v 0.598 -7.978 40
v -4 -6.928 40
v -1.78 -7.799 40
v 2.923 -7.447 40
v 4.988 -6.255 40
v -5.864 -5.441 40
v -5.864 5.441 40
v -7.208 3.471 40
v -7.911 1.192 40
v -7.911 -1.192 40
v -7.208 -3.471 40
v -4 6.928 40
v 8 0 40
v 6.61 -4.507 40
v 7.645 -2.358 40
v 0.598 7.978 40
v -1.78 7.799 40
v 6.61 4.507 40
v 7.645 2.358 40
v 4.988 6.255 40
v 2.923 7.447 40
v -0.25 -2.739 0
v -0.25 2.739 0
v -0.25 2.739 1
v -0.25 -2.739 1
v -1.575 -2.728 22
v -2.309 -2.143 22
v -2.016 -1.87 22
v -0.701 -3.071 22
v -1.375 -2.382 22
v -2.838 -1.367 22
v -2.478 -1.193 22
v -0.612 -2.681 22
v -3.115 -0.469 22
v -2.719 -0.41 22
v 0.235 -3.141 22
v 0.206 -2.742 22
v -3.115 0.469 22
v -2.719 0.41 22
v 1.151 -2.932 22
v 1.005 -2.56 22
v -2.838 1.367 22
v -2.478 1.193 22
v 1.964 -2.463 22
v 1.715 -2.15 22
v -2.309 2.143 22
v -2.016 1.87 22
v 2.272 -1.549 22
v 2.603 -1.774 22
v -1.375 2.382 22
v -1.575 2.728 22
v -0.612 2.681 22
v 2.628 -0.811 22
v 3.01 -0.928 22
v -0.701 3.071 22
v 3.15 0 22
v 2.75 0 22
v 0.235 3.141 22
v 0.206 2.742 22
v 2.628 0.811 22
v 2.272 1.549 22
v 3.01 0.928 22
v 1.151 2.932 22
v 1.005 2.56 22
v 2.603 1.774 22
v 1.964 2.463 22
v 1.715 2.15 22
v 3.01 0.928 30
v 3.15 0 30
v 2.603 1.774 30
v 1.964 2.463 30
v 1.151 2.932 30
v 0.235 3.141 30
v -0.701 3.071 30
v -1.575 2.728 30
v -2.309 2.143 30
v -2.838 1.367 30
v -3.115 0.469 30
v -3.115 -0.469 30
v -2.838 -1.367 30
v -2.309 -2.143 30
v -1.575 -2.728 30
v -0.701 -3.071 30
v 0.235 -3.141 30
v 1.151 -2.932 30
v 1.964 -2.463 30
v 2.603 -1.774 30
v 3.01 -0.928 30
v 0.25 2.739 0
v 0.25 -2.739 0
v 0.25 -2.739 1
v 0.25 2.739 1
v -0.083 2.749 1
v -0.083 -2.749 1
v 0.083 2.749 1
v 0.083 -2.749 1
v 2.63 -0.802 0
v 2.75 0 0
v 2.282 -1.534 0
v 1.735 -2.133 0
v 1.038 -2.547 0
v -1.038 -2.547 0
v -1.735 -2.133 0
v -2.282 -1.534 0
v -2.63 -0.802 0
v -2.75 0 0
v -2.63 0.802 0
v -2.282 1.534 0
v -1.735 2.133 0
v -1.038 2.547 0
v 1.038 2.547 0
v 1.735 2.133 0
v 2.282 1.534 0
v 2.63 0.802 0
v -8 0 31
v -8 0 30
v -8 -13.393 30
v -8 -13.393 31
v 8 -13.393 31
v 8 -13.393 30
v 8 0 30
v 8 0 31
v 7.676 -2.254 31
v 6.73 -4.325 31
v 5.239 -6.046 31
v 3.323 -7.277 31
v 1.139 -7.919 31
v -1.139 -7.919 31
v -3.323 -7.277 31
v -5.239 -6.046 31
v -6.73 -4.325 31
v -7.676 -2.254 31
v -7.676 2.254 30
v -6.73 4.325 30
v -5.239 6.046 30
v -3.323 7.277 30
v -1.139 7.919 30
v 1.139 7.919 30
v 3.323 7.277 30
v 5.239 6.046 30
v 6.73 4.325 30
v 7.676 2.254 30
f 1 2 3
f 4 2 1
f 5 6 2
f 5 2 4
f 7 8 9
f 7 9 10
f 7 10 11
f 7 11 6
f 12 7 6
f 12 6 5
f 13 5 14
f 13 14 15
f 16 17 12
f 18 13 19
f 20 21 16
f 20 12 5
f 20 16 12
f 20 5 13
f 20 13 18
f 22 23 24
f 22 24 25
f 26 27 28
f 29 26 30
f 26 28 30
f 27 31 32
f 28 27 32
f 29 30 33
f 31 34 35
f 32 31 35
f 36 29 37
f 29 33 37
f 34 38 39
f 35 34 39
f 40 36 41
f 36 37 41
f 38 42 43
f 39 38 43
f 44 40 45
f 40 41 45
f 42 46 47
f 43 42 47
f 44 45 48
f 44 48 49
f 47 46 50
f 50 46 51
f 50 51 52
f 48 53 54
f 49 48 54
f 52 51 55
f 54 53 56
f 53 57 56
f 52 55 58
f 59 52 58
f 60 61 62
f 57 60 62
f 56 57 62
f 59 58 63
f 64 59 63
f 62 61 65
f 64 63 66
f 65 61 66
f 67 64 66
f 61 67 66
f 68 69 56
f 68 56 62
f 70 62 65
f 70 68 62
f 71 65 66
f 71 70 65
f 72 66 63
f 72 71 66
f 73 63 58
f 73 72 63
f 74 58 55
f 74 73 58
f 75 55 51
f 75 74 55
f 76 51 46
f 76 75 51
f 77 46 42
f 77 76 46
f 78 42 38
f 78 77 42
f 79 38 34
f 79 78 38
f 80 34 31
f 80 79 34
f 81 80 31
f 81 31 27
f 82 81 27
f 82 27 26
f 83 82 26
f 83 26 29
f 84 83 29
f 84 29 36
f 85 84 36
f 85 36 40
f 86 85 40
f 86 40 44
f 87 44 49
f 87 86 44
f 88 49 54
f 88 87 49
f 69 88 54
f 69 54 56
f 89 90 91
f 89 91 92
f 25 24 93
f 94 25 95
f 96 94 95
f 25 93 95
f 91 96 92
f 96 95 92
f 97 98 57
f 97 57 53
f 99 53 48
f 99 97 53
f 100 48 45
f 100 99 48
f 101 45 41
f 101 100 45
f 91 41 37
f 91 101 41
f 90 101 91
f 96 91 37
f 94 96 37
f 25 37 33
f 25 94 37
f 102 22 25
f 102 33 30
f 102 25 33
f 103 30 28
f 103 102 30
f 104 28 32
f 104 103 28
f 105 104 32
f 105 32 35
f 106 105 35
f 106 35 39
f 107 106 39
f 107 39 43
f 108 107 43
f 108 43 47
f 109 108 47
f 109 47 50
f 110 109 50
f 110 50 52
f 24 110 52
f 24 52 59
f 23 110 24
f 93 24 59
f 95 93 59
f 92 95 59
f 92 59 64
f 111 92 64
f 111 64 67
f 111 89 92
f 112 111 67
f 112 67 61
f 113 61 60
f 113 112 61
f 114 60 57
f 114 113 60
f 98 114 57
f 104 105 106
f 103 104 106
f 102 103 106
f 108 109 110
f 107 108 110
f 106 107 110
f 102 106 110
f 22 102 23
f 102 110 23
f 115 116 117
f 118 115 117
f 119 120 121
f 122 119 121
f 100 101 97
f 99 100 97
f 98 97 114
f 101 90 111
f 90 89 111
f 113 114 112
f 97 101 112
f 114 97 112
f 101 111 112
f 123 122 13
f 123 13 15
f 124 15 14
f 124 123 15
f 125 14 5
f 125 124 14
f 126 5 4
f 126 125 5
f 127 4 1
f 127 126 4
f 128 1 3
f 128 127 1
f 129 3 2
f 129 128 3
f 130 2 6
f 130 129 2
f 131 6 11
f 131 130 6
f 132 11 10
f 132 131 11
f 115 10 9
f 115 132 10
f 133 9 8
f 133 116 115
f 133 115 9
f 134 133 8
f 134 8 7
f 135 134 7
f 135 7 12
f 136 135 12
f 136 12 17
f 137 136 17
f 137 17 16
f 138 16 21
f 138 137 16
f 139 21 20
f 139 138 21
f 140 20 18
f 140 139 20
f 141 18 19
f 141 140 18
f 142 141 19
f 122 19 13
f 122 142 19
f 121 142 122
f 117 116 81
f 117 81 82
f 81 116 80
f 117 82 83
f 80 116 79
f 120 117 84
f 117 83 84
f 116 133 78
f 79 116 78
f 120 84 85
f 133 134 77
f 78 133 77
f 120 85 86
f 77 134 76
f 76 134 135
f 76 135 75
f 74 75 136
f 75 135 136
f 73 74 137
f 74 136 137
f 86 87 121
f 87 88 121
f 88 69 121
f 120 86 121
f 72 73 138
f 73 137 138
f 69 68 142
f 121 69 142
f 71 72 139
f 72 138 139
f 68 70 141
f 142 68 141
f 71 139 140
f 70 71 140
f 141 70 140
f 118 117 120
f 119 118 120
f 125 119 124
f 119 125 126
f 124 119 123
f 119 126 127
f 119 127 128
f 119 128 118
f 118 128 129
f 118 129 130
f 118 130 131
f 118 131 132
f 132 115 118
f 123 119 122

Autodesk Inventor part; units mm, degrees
ref_plane "YZ Plane" through (0, 0, 0) normal (1, 0, 0) x (0, 1, 0)
ref_plane "XZ Plane" through (0, 0, 0) normal (0, 1, 0) x (-1, 0, 0)
ref_plane "XY Plane" through (0, 0, 0) normal (0, 0, 1) x (1, 0, 0)
sketch "Sketch1" plane through (0, 0, 0) normal (0, 0, 1) x (1, 0, 0)
  circle A0 centre (0, 0) radius 2.75
  line L0 (0.25, -4.8394) -> (0.25, 4.8394)
  line L1 (0.25, 4.8394) -> (-0.25, 4.8394)
  line L2 (-0.25, 4.8394) -> (-0.25, -4.8394)
  line L3 (-0.25, -4.8394) -> (0.25, -4.8394)
  line L4 (0.25, -4.8394) -> (-0.25, 4.8394) construction
  line L5 (0.25, 4.8394) -> (-0.25, -4.8394) construction
  point P0 (-0.25, 2.7386)
  point P1 (-0.25, -2.7386)
  point P2 (0.25, -2.7386)
  point P3 (0.25, 2.7386)
  dimension "d0" = 5.5
  dimension "d1" = 0.5
extrude "Extrusion1" add sketch "Sketch1" along normal blind 30 contours A0 L0 | L0 A0 L2 | L2 A0
extrude "Extrusion2" cut sketch "Sketch1" along normal blind 1 contours L0 A0 L2
sketch "Sketch2" plane through (0, 0, 30) normal (0, 0, 1) x (1, 0, 0)
  circle A0 centre (0, 0) radius 3.15
  dimension "d6" = 6.3
extrude "Extrusion3" add sketch "Sketch2" against normal blind 8
thread "Thread1" size "M7x1" class "6g" standard "ANSI Metric M Profile" full length
sketch "Sketch3" plane through (0, 0, 30) normal (0, 0, 1) x (1, 0, 0)
  circle A0 centre (0, 0) radius 8
  dimension "d11" = 16
extrude "Extrusion4" add sketch "Sketch3" along normal blind 10
sketch "Sketch4" plane through (0, 0, 30) normal (0, 0, -1) x (-1, 0, 0)
  line L0 (-8, 13.3929) -> (8, 13.3929)
  line L1 (8, 13.3929) -> (8, -13.3929)
  line L2 (8, -13.3929) -> (-8, -13.3929)
  line L3 (-8, -13.3929) -> (-8, 13.3929)
  line L4 (-8, 13.3929) -> (8, -13.3929) construction
  line L5 (8, 13.3929) -> (-8, -13.3929) construction
  line L6 (8, 0) -> (-8, 0)
  circle A0 centre (0, 0) radius 8 projected
  point P0 (-5.7062, 5.6071)
  dimension "d17" = 19
extrude "Extrusion5" add sketch "Sketch4" against normal blind 1 contours A0 L1 L2 L3 | L6 A0 picked at (-1.8203, -3.4339)
properties part number "Potentiometer" material "ABS Plastic"
